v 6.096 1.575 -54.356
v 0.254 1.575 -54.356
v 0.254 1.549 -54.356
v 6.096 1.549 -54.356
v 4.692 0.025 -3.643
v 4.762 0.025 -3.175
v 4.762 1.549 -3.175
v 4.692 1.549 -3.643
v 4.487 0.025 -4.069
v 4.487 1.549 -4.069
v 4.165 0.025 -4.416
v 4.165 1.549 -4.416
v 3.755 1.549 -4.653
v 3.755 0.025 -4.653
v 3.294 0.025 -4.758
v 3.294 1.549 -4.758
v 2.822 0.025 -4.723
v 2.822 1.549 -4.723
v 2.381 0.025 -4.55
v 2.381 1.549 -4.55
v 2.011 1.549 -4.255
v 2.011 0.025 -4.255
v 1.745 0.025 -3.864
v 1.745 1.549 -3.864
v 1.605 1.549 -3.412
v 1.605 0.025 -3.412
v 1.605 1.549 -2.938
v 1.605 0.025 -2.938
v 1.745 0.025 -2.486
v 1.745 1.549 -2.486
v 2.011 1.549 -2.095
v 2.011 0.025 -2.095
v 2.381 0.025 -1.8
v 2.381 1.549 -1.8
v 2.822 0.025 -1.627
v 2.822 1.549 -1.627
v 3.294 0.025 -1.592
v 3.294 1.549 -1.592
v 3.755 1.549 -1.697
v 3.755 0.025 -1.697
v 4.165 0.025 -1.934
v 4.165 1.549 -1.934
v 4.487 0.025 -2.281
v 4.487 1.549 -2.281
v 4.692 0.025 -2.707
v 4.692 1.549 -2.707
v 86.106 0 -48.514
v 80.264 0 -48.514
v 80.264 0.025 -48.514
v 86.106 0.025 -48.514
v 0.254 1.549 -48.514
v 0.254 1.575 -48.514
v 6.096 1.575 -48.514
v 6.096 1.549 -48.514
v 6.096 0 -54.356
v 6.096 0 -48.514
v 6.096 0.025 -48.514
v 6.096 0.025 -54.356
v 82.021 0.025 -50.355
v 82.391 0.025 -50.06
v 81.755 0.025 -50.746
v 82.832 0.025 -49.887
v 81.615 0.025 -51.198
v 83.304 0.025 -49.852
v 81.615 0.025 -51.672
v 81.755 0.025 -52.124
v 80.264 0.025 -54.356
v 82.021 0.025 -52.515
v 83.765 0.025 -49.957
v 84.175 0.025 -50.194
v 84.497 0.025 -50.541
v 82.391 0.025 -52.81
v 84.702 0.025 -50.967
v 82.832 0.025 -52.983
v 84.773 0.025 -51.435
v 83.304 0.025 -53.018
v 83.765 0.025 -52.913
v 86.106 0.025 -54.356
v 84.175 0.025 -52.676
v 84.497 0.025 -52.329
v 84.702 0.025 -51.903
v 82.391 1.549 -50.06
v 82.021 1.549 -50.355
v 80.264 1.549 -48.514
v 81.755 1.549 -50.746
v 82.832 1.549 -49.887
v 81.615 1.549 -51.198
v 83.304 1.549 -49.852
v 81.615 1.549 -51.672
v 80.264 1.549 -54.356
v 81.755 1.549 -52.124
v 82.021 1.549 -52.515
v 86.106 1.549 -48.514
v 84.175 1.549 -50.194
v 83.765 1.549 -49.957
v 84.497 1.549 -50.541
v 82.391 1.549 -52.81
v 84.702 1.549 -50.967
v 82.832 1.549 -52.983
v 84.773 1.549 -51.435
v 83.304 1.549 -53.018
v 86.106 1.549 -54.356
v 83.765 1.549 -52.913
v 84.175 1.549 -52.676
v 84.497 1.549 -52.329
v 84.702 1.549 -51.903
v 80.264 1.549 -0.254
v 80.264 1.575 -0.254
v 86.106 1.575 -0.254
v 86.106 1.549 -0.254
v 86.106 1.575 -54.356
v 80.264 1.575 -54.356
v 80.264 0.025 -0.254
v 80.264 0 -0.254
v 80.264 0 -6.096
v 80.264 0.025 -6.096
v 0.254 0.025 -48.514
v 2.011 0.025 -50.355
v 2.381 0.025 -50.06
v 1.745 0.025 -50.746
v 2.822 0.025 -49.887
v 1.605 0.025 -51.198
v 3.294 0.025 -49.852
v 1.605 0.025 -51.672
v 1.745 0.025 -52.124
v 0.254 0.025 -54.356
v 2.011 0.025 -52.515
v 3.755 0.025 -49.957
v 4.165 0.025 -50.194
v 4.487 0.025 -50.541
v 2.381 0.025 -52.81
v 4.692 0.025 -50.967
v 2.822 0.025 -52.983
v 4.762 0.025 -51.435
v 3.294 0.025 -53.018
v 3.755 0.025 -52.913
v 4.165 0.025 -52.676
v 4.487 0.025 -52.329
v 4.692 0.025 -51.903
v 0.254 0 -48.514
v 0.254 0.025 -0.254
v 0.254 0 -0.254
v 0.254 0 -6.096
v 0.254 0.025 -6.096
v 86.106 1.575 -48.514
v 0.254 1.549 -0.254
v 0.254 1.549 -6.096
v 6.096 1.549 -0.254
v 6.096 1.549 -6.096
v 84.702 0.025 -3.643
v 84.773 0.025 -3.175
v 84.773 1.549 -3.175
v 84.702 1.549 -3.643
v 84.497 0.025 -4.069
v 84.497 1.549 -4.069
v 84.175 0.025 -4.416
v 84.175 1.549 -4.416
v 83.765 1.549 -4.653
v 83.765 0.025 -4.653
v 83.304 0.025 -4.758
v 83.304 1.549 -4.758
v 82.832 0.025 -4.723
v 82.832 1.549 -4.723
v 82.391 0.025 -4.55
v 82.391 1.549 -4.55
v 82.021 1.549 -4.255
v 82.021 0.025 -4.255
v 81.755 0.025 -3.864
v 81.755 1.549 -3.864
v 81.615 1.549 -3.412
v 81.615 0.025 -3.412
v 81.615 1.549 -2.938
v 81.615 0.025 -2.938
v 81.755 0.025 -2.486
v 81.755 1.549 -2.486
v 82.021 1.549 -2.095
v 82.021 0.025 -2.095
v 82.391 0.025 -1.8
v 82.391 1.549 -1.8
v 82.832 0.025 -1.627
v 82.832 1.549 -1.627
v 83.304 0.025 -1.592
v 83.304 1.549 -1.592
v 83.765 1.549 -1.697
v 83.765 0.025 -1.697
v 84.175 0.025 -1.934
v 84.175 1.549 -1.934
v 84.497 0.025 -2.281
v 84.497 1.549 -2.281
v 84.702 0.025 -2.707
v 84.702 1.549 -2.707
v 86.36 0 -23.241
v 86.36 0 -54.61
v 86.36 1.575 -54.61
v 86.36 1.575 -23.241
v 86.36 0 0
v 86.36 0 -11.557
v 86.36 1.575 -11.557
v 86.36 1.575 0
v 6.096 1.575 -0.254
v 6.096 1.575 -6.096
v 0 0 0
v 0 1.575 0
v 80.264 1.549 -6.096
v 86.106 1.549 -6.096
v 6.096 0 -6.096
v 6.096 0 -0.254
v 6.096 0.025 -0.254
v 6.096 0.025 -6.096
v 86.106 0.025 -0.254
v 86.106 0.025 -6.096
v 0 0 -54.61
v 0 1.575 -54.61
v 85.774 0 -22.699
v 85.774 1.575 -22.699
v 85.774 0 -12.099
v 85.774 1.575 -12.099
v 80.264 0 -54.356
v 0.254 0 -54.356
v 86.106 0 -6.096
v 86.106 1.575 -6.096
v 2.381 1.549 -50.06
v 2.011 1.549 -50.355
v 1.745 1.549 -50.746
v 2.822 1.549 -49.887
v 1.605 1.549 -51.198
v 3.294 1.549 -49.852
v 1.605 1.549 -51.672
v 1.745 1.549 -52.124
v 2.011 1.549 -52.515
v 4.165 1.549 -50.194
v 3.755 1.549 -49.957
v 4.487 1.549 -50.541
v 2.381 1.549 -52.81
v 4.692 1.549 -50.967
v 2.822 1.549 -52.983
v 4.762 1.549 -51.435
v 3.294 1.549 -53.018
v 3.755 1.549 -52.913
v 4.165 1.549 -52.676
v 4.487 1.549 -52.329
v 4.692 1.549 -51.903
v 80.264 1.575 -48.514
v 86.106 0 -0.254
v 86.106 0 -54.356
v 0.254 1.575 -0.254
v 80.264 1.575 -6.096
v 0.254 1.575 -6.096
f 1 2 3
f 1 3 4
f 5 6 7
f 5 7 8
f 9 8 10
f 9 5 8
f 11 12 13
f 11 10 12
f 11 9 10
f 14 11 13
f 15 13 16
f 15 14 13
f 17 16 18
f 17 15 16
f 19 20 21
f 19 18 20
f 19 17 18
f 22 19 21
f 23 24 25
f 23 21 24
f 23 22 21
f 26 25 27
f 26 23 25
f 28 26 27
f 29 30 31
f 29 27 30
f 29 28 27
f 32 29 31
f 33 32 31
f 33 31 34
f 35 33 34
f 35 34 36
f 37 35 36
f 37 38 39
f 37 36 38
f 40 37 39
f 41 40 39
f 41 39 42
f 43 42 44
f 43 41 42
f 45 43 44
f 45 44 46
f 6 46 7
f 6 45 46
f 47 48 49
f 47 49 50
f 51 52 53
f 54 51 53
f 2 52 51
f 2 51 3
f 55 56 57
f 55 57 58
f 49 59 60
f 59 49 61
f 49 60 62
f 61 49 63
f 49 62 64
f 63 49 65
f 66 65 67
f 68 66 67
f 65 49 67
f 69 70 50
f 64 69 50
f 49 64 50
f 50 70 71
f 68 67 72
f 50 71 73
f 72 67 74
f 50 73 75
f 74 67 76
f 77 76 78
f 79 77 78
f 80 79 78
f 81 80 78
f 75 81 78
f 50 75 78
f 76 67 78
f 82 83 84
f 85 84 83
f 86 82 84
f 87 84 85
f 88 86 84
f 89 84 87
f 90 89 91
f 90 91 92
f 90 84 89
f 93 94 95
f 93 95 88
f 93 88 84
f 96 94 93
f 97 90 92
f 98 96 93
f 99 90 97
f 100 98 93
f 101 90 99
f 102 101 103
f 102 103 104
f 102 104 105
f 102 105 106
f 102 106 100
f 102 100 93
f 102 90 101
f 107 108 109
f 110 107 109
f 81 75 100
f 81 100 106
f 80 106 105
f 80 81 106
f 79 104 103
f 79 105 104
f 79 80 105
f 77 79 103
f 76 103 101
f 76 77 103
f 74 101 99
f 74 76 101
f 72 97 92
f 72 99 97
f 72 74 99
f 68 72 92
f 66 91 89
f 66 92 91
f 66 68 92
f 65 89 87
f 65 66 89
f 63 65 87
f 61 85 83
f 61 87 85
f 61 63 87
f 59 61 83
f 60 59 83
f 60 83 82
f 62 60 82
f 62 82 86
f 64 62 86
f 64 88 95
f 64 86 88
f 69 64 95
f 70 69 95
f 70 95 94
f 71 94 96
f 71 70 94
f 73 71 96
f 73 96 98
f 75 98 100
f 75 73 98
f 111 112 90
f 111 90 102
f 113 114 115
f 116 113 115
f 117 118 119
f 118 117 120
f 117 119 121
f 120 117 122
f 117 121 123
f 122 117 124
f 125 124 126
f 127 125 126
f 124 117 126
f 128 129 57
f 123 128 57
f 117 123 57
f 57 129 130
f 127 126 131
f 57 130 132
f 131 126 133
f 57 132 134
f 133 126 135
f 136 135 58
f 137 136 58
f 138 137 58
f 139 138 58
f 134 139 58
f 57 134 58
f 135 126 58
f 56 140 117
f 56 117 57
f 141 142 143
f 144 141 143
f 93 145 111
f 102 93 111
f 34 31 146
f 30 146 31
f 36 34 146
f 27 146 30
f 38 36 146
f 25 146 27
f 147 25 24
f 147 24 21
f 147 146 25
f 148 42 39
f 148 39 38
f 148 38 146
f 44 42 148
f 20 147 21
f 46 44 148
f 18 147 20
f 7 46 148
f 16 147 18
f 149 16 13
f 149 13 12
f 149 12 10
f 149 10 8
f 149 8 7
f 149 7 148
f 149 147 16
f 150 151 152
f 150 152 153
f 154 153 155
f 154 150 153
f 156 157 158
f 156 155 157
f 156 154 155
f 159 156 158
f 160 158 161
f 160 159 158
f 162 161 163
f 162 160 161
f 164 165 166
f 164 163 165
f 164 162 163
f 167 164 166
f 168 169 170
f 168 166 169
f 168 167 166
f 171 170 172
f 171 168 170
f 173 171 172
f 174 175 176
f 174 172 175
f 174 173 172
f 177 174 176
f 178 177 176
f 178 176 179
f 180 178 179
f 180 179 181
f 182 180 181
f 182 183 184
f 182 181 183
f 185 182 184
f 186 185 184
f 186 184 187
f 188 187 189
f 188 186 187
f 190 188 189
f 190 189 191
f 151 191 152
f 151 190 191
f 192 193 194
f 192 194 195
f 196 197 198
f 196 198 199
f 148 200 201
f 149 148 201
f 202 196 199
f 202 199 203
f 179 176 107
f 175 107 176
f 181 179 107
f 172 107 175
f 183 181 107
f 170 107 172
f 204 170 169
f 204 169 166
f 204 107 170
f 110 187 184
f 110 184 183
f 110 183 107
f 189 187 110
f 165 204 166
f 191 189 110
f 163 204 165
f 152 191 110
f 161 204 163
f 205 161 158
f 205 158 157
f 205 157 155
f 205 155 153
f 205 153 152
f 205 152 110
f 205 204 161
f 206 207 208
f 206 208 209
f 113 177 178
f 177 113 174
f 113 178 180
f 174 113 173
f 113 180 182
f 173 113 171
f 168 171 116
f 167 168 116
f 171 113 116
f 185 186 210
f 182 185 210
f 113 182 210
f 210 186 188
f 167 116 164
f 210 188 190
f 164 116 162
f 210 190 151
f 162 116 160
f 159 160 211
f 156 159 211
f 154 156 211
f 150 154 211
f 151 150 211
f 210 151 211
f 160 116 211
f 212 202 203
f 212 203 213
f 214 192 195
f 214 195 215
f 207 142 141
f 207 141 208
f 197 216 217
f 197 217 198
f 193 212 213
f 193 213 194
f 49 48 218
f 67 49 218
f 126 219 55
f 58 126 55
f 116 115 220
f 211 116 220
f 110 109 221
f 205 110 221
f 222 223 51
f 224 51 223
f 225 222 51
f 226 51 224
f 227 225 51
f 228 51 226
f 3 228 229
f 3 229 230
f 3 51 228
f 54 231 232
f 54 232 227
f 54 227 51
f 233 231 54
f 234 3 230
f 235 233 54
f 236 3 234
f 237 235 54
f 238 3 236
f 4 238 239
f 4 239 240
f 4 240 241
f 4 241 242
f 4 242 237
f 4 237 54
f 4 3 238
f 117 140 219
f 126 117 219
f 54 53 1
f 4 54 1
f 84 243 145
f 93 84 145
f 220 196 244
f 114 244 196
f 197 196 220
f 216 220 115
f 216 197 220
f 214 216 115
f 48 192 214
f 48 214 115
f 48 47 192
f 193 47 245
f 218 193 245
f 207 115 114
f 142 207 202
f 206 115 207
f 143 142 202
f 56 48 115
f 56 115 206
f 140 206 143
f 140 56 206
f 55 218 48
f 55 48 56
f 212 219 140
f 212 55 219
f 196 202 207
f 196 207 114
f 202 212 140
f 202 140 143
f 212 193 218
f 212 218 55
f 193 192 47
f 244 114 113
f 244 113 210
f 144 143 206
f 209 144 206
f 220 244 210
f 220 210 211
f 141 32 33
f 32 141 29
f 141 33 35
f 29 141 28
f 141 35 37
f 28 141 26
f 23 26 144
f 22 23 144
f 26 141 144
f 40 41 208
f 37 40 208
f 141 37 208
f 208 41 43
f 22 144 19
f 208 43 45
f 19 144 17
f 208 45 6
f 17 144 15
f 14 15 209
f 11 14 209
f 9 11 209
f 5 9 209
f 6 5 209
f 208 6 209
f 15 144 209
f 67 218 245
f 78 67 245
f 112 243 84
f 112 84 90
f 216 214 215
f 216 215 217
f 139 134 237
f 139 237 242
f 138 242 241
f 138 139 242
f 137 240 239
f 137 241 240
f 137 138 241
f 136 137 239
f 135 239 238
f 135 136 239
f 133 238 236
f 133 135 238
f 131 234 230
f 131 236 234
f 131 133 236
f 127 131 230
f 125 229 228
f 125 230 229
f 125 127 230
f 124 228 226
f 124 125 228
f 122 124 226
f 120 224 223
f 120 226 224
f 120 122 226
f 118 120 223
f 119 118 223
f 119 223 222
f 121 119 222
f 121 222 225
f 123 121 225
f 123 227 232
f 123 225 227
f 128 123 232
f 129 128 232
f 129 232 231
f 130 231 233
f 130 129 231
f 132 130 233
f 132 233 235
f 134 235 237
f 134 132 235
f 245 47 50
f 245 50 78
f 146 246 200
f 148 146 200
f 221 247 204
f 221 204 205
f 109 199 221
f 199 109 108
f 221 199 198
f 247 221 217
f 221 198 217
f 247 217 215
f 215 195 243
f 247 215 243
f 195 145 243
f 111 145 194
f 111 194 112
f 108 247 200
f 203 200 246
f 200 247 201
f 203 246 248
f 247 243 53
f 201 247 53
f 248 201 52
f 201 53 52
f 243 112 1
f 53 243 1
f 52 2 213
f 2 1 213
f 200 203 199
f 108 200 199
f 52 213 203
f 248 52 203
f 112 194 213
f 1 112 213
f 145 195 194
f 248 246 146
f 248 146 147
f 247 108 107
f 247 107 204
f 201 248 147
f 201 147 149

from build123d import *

# Parameters (mm, degrees)
SKETCH1_R           = 1.5875
BOSS_EXTRUDE1_DEPTH = 1.5748
SKETCH2_W           = 5.842
SKETCH2_H           = 5.842
CUT_EXTRUDE1_DEPTH  = 0.0254
CUT_EXTRUDE2_START  = -1.5748
SKETCH2_2_W         = 5.842
SKETCH2_2_H         = 5.842
CUT_EXTRUDE2_DEPTH  = 0.0254


with BuildPart() as part:
    # Sketch1 → Boss-Extrude1 (new body)
    with BuildSketch(Plane(origin=(0, 0, 0), x_dir=(1, 0, 0), z_dir=(0, 1, 0))):
        Polygon((85.774022, 22.698964), (85.774022, 12.099036), (86.36, 11.557), (86.36, 0), (0, 0), (0, 54.61), (86.36, 54.61), (86.36, 23.241), align=None)
        with Locations((3.175, 51.435)):
            Circle(SKETCH1_R, mode=Mode.SUBTRACT)
        with Locations((3.175, 3.175)):
            Circle(SKETCH1_R, mode=Mode.SUBTRACT)
        with Locations((83.185, 3.175)):
            Circle(SKETCH1_R, mode=Mode.SUBTRACT)
        with Locations((83.185, 51.435)):
            Circle(SKETCH1_R, mode=Mode.SUBTRACT)
    extrude(amount=BOSS_EXTRUDE1_DEPTH)

    # Sketch2 → Cut-Extrude1 (cut)
    with BuildSketch(Plane(origin=(0, 1.5748, 0), x_dir=(1, 0, 0), z_dir=(0, 1, 0))):
        with Locations((3.175, 51.435)):
            Rectangle(SKETCH2_W, SKETCH2_H)
        with Locations((3.175, 3.175)):
            Rectangle(SKETCH2_W, SKETCH2_H)
        with Locations((83.185, 3.175)):
            Rectangle(SKETCH2_W, SKETCH2_H)
        with Locations((83.185, 51.435)):
            Rectangle(SKETCH2_W, SKETCH2_H)
    extrude(amount=-CUT_EXTRUDE1_DEPTH, mode=Mode.SUBTRACT)

    # Sketch2<2> → Cut-Extrude2 (cut)
    with BuildSketch(Plane(origin=(0, 1.5748, 0), x_dir=(1, 0, 0), z_dir=(0, 1, 0)).offset(CUT_EXTRUDE2_START)):
        with Locations((3.175, 51.435)):
            Rectangle(SKETCH2_2_W, SKETCH2_2_H)
        with Locations((3.175, 3.175)):
            Rectangle(SKETCH2_2_W, SKETCH2_2_H)
        with Locations((83.185, 3.175)):
            Rectangle(SKETCH2_2_W, SKETCH2_2_H)
        with Locations((83.185, 51.435)):
            Rectangle(SKETCH2_2_W, SKETCH2_2_H)
    extrude(amount=CUT_EXTRUDE2_DEPTH, mode=Mode.SUBTRACT)


solid = part.part
